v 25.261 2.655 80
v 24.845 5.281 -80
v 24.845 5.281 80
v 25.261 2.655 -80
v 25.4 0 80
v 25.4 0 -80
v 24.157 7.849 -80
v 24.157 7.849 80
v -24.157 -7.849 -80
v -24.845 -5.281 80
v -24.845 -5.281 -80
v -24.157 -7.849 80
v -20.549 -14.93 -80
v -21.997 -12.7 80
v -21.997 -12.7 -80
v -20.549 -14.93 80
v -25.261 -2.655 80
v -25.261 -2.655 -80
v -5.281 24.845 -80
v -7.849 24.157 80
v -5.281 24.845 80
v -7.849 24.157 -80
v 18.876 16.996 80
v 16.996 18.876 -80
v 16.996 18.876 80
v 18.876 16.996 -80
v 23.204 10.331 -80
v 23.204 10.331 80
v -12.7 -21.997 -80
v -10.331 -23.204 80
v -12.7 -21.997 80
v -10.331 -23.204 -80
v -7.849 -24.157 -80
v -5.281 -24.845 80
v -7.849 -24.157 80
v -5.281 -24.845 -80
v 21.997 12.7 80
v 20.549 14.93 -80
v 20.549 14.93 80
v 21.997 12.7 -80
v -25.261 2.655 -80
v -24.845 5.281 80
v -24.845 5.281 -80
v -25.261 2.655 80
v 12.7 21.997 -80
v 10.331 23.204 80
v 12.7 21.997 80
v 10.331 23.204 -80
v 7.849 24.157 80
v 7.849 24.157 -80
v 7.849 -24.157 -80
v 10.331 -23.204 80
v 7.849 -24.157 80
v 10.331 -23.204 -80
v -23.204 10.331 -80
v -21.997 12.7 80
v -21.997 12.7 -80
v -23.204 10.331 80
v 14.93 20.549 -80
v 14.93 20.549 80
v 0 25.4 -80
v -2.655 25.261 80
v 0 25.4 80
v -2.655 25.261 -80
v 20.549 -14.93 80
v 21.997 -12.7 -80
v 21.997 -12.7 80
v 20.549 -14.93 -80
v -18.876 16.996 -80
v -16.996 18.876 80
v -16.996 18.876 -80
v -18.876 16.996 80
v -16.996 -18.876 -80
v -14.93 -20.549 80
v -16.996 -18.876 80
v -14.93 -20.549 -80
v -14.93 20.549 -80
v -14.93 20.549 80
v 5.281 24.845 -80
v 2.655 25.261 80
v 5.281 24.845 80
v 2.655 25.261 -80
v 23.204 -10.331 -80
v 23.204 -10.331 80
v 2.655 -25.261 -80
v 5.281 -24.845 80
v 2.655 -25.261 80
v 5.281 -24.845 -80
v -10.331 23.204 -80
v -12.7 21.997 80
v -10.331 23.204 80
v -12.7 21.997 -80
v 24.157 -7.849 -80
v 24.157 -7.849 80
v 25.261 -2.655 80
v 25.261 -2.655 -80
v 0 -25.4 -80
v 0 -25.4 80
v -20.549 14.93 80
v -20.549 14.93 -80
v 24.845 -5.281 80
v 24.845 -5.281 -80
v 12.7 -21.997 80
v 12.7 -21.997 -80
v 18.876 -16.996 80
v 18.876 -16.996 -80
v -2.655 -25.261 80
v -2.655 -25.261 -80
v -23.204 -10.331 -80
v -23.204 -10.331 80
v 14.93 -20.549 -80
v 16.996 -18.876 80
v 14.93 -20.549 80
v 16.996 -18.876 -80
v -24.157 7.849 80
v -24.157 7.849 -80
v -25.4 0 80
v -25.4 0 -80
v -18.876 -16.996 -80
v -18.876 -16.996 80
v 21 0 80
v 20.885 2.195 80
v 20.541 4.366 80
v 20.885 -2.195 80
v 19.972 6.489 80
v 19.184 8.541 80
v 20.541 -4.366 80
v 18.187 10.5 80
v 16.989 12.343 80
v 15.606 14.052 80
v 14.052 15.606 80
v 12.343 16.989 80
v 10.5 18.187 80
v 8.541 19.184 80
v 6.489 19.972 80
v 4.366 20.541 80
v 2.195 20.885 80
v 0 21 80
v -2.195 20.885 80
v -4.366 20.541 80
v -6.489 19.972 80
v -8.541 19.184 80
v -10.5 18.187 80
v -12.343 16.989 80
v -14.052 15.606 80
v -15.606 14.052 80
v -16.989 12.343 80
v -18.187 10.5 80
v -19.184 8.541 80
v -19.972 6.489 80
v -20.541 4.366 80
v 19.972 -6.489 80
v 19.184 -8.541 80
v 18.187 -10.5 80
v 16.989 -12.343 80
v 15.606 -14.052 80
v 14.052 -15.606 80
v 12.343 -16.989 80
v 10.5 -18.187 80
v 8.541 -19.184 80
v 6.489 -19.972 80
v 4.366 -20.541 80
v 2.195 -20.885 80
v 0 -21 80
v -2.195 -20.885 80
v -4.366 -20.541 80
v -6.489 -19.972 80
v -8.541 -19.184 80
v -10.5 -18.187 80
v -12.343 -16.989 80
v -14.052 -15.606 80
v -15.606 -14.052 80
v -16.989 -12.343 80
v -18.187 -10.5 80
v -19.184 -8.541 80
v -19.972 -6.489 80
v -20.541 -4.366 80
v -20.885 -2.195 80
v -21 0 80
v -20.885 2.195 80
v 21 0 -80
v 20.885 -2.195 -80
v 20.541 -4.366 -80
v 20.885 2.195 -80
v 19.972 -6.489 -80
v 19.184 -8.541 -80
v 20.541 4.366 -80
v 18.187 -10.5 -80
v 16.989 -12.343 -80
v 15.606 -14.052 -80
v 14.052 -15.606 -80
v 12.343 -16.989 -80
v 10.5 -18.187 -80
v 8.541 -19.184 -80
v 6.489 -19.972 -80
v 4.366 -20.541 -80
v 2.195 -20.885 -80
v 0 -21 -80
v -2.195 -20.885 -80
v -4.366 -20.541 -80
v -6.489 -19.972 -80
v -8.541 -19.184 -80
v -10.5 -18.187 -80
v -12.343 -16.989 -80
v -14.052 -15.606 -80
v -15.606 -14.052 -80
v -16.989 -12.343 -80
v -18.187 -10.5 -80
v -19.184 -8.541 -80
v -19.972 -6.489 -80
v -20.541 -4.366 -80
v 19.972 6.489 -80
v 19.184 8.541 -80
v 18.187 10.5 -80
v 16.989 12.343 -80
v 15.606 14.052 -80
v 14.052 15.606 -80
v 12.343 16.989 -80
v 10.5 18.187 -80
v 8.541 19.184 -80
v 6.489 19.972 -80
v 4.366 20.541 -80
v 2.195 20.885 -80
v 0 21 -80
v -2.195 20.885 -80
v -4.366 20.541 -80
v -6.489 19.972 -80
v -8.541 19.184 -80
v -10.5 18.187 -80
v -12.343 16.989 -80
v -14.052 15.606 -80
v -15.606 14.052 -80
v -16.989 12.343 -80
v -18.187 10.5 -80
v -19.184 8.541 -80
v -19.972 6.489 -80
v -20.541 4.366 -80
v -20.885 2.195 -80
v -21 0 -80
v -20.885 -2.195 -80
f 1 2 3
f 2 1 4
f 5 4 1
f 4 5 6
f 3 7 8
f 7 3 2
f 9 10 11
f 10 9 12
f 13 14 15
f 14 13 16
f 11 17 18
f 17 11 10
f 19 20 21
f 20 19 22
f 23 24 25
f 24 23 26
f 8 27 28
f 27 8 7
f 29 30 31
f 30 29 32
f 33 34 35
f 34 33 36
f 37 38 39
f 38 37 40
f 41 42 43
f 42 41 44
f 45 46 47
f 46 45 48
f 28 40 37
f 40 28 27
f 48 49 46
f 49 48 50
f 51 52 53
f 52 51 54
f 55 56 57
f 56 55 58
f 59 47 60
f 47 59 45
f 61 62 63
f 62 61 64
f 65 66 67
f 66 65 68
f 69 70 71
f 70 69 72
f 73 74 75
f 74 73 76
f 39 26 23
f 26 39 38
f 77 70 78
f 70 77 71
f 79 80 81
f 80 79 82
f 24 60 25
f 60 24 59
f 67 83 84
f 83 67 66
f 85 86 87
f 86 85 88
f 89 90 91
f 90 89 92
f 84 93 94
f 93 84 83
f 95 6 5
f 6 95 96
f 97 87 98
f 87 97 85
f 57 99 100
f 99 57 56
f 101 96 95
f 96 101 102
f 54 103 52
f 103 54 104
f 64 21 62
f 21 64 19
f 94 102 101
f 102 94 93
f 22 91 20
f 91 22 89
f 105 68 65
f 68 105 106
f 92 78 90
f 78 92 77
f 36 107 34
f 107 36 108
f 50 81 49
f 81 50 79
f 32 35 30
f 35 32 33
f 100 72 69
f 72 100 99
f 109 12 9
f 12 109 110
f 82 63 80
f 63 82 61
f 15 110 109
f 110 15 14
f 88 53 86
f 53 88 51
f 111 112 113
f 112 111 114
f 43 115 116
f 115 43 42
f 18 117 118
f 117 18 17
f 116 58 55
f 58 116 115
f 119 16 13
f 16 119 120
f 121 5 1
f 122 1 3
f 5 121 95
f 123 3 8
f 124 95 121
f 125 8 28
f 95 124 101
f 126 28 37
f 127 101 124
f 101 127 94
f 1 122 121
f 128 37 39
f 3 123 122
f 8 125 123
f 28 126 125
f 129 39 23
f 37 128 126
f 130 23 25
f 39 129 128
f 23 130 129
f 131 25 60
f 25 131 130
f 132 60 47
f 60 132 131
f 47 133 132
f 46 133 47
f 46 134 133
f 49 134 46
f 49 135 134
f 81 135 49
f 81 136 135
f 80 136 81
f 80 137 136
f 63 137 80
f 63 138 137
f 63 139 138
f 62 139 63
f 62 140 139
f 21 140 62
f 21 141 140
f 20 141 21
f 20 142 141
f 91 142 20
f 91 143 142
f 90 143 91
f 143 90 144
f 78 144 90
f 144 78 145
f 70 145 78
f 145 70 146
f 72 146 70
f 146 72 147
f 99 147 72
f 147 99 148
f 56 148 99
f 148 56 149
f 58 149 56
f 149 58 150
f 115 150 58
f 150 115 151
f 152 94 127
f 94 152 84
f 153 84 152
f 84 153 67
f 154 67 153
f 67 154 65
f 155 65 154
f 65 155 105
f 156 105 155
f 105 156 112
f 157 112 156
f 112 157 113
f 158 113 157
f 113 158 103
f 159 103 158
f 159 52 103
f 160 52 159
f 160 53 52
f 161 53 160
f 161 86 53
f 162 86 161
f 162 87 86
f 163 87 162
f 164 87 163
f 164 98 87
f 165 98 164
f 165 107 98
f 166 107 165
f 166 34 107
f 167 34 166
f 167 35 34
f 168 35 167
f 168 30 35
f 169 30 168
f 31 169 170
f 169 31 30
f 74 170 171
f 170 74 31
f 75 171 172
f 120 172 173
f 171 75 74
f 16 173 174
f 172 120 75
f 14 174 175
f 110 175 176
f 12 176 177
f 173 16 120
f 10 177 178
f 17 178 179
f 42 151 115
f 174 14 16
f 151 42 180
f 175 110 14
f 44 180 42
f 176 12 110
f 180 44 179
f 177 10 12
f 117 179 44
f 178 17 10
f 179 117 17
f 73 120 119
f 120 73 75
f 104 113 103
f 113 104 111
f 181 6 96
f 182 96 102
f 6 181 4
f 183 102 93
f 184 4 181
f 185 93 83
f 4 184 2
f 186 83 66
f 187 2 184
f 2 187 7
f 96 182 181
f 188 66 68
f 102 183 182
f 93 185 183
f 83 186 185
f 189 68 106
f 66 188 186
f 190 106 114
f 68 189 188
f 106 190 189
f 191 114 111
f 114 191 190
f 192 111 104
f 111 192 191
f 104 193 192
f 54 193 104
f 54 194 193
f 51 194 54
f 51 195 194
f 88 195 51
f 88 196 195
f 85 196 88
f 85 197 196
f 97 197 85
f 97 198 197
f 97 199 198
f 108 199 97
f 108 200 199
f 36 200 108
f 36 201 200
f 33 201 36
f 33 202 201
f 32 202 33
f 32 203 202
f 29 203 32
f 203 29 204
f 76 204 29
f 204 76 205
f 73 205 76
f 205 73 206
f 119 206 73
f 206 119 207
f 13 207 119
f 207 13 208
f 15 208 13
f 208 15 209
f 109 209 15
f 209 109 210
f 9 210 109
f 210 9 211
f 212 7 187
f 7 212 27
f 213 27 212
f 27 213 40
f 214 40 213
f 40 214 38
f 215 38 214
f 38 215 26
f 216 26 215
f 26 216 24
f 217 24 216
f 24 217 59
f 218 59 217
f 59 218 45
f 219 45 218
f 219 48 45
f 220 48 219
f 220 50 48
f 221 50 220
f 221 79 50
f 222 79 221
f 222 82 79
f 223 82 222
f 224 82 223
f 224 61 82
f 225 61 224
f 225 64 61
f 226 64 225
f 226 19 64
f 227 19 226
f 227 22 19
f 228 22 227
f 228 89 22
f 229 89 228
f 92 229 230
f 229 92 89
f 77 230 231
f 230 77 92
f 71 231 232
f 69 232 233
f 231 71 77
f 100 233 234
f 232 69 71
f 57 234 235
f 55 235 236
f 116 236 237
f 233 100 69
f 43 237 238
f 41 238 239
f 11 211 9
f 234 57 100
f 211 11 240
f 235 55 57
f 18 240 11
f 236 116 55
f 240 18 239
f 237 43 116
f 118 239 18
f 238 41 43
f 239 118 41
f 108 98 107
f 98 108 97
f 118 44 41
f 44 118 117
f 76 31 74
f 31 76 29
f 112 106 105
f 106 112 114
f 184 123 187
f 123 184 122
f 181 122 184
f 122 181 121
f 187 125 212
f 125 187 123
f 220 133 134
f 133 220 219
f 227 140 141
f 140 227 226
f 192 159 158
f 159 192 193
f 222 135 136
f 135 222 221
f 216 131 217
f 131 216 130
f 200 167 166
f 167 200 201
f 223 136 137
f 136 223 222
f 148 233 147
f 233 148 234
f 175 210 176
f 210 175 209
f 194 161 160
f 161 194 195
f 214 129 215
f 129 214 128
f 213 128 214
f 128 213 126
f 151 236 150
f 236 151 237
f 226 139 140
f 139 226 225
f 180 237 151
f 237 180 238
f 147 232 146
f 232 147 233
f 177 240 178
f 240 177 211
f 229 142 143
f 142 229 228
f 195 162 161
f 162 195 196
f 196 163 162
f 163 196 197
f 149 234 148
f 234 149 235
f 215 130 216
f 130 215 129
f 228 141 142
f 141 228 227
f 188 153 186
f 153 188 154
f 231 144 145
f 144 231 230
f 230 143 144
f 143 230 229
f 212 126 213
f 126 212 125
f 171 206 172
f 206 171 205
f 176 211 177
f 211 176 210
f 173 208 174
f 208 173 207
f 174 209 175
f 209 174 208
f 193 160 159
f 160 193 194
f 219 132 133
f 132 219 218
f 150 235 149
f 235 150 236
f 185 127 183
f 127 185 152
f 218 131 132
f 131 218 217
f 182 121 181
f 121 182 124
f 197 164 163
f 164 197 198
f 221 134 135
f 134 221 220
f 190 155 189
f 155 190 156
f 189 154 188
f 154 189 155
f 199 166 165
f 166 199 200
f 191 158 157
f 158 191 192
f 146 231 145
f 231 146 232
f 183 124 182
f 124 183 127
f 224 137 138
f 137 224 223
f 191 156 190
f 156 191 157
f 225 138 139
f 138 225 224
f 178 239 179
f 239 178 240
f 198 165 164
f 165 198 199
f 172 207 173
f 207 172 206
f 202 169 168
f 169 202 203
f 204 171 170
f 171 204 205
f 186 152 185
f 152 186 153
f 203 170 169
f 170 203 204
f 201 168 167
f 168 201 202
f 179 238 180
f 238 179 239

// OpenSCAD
// Gundam Robotics Systems - Assembly & Cooling Chassis
// Features Vane-Axial channels for 48V Fan System

$fn = 60;

// Assembly Constants
total_od = 50.8; // 2-inch outer envelope
length = 160;

difference() {
    // Main Exoskeleton (Berry Compliant Aluminum/Carbon Fiber)
    cylinder(h = length, d = total_od, center = true);
    
    // Internal Core Void (Fits Liner + 4 Coil Layers)
    cylinder(h = length + 5, d = 42, center = true);
    
    // Vane-Axial Cooling Channels
    for (a = [0 : 45 : 359]) {
        rotate([0, 0, a])
        translate([18, 0, 0])
        cylinder(h = length + 10, d = 4, center = true);
    }
}
